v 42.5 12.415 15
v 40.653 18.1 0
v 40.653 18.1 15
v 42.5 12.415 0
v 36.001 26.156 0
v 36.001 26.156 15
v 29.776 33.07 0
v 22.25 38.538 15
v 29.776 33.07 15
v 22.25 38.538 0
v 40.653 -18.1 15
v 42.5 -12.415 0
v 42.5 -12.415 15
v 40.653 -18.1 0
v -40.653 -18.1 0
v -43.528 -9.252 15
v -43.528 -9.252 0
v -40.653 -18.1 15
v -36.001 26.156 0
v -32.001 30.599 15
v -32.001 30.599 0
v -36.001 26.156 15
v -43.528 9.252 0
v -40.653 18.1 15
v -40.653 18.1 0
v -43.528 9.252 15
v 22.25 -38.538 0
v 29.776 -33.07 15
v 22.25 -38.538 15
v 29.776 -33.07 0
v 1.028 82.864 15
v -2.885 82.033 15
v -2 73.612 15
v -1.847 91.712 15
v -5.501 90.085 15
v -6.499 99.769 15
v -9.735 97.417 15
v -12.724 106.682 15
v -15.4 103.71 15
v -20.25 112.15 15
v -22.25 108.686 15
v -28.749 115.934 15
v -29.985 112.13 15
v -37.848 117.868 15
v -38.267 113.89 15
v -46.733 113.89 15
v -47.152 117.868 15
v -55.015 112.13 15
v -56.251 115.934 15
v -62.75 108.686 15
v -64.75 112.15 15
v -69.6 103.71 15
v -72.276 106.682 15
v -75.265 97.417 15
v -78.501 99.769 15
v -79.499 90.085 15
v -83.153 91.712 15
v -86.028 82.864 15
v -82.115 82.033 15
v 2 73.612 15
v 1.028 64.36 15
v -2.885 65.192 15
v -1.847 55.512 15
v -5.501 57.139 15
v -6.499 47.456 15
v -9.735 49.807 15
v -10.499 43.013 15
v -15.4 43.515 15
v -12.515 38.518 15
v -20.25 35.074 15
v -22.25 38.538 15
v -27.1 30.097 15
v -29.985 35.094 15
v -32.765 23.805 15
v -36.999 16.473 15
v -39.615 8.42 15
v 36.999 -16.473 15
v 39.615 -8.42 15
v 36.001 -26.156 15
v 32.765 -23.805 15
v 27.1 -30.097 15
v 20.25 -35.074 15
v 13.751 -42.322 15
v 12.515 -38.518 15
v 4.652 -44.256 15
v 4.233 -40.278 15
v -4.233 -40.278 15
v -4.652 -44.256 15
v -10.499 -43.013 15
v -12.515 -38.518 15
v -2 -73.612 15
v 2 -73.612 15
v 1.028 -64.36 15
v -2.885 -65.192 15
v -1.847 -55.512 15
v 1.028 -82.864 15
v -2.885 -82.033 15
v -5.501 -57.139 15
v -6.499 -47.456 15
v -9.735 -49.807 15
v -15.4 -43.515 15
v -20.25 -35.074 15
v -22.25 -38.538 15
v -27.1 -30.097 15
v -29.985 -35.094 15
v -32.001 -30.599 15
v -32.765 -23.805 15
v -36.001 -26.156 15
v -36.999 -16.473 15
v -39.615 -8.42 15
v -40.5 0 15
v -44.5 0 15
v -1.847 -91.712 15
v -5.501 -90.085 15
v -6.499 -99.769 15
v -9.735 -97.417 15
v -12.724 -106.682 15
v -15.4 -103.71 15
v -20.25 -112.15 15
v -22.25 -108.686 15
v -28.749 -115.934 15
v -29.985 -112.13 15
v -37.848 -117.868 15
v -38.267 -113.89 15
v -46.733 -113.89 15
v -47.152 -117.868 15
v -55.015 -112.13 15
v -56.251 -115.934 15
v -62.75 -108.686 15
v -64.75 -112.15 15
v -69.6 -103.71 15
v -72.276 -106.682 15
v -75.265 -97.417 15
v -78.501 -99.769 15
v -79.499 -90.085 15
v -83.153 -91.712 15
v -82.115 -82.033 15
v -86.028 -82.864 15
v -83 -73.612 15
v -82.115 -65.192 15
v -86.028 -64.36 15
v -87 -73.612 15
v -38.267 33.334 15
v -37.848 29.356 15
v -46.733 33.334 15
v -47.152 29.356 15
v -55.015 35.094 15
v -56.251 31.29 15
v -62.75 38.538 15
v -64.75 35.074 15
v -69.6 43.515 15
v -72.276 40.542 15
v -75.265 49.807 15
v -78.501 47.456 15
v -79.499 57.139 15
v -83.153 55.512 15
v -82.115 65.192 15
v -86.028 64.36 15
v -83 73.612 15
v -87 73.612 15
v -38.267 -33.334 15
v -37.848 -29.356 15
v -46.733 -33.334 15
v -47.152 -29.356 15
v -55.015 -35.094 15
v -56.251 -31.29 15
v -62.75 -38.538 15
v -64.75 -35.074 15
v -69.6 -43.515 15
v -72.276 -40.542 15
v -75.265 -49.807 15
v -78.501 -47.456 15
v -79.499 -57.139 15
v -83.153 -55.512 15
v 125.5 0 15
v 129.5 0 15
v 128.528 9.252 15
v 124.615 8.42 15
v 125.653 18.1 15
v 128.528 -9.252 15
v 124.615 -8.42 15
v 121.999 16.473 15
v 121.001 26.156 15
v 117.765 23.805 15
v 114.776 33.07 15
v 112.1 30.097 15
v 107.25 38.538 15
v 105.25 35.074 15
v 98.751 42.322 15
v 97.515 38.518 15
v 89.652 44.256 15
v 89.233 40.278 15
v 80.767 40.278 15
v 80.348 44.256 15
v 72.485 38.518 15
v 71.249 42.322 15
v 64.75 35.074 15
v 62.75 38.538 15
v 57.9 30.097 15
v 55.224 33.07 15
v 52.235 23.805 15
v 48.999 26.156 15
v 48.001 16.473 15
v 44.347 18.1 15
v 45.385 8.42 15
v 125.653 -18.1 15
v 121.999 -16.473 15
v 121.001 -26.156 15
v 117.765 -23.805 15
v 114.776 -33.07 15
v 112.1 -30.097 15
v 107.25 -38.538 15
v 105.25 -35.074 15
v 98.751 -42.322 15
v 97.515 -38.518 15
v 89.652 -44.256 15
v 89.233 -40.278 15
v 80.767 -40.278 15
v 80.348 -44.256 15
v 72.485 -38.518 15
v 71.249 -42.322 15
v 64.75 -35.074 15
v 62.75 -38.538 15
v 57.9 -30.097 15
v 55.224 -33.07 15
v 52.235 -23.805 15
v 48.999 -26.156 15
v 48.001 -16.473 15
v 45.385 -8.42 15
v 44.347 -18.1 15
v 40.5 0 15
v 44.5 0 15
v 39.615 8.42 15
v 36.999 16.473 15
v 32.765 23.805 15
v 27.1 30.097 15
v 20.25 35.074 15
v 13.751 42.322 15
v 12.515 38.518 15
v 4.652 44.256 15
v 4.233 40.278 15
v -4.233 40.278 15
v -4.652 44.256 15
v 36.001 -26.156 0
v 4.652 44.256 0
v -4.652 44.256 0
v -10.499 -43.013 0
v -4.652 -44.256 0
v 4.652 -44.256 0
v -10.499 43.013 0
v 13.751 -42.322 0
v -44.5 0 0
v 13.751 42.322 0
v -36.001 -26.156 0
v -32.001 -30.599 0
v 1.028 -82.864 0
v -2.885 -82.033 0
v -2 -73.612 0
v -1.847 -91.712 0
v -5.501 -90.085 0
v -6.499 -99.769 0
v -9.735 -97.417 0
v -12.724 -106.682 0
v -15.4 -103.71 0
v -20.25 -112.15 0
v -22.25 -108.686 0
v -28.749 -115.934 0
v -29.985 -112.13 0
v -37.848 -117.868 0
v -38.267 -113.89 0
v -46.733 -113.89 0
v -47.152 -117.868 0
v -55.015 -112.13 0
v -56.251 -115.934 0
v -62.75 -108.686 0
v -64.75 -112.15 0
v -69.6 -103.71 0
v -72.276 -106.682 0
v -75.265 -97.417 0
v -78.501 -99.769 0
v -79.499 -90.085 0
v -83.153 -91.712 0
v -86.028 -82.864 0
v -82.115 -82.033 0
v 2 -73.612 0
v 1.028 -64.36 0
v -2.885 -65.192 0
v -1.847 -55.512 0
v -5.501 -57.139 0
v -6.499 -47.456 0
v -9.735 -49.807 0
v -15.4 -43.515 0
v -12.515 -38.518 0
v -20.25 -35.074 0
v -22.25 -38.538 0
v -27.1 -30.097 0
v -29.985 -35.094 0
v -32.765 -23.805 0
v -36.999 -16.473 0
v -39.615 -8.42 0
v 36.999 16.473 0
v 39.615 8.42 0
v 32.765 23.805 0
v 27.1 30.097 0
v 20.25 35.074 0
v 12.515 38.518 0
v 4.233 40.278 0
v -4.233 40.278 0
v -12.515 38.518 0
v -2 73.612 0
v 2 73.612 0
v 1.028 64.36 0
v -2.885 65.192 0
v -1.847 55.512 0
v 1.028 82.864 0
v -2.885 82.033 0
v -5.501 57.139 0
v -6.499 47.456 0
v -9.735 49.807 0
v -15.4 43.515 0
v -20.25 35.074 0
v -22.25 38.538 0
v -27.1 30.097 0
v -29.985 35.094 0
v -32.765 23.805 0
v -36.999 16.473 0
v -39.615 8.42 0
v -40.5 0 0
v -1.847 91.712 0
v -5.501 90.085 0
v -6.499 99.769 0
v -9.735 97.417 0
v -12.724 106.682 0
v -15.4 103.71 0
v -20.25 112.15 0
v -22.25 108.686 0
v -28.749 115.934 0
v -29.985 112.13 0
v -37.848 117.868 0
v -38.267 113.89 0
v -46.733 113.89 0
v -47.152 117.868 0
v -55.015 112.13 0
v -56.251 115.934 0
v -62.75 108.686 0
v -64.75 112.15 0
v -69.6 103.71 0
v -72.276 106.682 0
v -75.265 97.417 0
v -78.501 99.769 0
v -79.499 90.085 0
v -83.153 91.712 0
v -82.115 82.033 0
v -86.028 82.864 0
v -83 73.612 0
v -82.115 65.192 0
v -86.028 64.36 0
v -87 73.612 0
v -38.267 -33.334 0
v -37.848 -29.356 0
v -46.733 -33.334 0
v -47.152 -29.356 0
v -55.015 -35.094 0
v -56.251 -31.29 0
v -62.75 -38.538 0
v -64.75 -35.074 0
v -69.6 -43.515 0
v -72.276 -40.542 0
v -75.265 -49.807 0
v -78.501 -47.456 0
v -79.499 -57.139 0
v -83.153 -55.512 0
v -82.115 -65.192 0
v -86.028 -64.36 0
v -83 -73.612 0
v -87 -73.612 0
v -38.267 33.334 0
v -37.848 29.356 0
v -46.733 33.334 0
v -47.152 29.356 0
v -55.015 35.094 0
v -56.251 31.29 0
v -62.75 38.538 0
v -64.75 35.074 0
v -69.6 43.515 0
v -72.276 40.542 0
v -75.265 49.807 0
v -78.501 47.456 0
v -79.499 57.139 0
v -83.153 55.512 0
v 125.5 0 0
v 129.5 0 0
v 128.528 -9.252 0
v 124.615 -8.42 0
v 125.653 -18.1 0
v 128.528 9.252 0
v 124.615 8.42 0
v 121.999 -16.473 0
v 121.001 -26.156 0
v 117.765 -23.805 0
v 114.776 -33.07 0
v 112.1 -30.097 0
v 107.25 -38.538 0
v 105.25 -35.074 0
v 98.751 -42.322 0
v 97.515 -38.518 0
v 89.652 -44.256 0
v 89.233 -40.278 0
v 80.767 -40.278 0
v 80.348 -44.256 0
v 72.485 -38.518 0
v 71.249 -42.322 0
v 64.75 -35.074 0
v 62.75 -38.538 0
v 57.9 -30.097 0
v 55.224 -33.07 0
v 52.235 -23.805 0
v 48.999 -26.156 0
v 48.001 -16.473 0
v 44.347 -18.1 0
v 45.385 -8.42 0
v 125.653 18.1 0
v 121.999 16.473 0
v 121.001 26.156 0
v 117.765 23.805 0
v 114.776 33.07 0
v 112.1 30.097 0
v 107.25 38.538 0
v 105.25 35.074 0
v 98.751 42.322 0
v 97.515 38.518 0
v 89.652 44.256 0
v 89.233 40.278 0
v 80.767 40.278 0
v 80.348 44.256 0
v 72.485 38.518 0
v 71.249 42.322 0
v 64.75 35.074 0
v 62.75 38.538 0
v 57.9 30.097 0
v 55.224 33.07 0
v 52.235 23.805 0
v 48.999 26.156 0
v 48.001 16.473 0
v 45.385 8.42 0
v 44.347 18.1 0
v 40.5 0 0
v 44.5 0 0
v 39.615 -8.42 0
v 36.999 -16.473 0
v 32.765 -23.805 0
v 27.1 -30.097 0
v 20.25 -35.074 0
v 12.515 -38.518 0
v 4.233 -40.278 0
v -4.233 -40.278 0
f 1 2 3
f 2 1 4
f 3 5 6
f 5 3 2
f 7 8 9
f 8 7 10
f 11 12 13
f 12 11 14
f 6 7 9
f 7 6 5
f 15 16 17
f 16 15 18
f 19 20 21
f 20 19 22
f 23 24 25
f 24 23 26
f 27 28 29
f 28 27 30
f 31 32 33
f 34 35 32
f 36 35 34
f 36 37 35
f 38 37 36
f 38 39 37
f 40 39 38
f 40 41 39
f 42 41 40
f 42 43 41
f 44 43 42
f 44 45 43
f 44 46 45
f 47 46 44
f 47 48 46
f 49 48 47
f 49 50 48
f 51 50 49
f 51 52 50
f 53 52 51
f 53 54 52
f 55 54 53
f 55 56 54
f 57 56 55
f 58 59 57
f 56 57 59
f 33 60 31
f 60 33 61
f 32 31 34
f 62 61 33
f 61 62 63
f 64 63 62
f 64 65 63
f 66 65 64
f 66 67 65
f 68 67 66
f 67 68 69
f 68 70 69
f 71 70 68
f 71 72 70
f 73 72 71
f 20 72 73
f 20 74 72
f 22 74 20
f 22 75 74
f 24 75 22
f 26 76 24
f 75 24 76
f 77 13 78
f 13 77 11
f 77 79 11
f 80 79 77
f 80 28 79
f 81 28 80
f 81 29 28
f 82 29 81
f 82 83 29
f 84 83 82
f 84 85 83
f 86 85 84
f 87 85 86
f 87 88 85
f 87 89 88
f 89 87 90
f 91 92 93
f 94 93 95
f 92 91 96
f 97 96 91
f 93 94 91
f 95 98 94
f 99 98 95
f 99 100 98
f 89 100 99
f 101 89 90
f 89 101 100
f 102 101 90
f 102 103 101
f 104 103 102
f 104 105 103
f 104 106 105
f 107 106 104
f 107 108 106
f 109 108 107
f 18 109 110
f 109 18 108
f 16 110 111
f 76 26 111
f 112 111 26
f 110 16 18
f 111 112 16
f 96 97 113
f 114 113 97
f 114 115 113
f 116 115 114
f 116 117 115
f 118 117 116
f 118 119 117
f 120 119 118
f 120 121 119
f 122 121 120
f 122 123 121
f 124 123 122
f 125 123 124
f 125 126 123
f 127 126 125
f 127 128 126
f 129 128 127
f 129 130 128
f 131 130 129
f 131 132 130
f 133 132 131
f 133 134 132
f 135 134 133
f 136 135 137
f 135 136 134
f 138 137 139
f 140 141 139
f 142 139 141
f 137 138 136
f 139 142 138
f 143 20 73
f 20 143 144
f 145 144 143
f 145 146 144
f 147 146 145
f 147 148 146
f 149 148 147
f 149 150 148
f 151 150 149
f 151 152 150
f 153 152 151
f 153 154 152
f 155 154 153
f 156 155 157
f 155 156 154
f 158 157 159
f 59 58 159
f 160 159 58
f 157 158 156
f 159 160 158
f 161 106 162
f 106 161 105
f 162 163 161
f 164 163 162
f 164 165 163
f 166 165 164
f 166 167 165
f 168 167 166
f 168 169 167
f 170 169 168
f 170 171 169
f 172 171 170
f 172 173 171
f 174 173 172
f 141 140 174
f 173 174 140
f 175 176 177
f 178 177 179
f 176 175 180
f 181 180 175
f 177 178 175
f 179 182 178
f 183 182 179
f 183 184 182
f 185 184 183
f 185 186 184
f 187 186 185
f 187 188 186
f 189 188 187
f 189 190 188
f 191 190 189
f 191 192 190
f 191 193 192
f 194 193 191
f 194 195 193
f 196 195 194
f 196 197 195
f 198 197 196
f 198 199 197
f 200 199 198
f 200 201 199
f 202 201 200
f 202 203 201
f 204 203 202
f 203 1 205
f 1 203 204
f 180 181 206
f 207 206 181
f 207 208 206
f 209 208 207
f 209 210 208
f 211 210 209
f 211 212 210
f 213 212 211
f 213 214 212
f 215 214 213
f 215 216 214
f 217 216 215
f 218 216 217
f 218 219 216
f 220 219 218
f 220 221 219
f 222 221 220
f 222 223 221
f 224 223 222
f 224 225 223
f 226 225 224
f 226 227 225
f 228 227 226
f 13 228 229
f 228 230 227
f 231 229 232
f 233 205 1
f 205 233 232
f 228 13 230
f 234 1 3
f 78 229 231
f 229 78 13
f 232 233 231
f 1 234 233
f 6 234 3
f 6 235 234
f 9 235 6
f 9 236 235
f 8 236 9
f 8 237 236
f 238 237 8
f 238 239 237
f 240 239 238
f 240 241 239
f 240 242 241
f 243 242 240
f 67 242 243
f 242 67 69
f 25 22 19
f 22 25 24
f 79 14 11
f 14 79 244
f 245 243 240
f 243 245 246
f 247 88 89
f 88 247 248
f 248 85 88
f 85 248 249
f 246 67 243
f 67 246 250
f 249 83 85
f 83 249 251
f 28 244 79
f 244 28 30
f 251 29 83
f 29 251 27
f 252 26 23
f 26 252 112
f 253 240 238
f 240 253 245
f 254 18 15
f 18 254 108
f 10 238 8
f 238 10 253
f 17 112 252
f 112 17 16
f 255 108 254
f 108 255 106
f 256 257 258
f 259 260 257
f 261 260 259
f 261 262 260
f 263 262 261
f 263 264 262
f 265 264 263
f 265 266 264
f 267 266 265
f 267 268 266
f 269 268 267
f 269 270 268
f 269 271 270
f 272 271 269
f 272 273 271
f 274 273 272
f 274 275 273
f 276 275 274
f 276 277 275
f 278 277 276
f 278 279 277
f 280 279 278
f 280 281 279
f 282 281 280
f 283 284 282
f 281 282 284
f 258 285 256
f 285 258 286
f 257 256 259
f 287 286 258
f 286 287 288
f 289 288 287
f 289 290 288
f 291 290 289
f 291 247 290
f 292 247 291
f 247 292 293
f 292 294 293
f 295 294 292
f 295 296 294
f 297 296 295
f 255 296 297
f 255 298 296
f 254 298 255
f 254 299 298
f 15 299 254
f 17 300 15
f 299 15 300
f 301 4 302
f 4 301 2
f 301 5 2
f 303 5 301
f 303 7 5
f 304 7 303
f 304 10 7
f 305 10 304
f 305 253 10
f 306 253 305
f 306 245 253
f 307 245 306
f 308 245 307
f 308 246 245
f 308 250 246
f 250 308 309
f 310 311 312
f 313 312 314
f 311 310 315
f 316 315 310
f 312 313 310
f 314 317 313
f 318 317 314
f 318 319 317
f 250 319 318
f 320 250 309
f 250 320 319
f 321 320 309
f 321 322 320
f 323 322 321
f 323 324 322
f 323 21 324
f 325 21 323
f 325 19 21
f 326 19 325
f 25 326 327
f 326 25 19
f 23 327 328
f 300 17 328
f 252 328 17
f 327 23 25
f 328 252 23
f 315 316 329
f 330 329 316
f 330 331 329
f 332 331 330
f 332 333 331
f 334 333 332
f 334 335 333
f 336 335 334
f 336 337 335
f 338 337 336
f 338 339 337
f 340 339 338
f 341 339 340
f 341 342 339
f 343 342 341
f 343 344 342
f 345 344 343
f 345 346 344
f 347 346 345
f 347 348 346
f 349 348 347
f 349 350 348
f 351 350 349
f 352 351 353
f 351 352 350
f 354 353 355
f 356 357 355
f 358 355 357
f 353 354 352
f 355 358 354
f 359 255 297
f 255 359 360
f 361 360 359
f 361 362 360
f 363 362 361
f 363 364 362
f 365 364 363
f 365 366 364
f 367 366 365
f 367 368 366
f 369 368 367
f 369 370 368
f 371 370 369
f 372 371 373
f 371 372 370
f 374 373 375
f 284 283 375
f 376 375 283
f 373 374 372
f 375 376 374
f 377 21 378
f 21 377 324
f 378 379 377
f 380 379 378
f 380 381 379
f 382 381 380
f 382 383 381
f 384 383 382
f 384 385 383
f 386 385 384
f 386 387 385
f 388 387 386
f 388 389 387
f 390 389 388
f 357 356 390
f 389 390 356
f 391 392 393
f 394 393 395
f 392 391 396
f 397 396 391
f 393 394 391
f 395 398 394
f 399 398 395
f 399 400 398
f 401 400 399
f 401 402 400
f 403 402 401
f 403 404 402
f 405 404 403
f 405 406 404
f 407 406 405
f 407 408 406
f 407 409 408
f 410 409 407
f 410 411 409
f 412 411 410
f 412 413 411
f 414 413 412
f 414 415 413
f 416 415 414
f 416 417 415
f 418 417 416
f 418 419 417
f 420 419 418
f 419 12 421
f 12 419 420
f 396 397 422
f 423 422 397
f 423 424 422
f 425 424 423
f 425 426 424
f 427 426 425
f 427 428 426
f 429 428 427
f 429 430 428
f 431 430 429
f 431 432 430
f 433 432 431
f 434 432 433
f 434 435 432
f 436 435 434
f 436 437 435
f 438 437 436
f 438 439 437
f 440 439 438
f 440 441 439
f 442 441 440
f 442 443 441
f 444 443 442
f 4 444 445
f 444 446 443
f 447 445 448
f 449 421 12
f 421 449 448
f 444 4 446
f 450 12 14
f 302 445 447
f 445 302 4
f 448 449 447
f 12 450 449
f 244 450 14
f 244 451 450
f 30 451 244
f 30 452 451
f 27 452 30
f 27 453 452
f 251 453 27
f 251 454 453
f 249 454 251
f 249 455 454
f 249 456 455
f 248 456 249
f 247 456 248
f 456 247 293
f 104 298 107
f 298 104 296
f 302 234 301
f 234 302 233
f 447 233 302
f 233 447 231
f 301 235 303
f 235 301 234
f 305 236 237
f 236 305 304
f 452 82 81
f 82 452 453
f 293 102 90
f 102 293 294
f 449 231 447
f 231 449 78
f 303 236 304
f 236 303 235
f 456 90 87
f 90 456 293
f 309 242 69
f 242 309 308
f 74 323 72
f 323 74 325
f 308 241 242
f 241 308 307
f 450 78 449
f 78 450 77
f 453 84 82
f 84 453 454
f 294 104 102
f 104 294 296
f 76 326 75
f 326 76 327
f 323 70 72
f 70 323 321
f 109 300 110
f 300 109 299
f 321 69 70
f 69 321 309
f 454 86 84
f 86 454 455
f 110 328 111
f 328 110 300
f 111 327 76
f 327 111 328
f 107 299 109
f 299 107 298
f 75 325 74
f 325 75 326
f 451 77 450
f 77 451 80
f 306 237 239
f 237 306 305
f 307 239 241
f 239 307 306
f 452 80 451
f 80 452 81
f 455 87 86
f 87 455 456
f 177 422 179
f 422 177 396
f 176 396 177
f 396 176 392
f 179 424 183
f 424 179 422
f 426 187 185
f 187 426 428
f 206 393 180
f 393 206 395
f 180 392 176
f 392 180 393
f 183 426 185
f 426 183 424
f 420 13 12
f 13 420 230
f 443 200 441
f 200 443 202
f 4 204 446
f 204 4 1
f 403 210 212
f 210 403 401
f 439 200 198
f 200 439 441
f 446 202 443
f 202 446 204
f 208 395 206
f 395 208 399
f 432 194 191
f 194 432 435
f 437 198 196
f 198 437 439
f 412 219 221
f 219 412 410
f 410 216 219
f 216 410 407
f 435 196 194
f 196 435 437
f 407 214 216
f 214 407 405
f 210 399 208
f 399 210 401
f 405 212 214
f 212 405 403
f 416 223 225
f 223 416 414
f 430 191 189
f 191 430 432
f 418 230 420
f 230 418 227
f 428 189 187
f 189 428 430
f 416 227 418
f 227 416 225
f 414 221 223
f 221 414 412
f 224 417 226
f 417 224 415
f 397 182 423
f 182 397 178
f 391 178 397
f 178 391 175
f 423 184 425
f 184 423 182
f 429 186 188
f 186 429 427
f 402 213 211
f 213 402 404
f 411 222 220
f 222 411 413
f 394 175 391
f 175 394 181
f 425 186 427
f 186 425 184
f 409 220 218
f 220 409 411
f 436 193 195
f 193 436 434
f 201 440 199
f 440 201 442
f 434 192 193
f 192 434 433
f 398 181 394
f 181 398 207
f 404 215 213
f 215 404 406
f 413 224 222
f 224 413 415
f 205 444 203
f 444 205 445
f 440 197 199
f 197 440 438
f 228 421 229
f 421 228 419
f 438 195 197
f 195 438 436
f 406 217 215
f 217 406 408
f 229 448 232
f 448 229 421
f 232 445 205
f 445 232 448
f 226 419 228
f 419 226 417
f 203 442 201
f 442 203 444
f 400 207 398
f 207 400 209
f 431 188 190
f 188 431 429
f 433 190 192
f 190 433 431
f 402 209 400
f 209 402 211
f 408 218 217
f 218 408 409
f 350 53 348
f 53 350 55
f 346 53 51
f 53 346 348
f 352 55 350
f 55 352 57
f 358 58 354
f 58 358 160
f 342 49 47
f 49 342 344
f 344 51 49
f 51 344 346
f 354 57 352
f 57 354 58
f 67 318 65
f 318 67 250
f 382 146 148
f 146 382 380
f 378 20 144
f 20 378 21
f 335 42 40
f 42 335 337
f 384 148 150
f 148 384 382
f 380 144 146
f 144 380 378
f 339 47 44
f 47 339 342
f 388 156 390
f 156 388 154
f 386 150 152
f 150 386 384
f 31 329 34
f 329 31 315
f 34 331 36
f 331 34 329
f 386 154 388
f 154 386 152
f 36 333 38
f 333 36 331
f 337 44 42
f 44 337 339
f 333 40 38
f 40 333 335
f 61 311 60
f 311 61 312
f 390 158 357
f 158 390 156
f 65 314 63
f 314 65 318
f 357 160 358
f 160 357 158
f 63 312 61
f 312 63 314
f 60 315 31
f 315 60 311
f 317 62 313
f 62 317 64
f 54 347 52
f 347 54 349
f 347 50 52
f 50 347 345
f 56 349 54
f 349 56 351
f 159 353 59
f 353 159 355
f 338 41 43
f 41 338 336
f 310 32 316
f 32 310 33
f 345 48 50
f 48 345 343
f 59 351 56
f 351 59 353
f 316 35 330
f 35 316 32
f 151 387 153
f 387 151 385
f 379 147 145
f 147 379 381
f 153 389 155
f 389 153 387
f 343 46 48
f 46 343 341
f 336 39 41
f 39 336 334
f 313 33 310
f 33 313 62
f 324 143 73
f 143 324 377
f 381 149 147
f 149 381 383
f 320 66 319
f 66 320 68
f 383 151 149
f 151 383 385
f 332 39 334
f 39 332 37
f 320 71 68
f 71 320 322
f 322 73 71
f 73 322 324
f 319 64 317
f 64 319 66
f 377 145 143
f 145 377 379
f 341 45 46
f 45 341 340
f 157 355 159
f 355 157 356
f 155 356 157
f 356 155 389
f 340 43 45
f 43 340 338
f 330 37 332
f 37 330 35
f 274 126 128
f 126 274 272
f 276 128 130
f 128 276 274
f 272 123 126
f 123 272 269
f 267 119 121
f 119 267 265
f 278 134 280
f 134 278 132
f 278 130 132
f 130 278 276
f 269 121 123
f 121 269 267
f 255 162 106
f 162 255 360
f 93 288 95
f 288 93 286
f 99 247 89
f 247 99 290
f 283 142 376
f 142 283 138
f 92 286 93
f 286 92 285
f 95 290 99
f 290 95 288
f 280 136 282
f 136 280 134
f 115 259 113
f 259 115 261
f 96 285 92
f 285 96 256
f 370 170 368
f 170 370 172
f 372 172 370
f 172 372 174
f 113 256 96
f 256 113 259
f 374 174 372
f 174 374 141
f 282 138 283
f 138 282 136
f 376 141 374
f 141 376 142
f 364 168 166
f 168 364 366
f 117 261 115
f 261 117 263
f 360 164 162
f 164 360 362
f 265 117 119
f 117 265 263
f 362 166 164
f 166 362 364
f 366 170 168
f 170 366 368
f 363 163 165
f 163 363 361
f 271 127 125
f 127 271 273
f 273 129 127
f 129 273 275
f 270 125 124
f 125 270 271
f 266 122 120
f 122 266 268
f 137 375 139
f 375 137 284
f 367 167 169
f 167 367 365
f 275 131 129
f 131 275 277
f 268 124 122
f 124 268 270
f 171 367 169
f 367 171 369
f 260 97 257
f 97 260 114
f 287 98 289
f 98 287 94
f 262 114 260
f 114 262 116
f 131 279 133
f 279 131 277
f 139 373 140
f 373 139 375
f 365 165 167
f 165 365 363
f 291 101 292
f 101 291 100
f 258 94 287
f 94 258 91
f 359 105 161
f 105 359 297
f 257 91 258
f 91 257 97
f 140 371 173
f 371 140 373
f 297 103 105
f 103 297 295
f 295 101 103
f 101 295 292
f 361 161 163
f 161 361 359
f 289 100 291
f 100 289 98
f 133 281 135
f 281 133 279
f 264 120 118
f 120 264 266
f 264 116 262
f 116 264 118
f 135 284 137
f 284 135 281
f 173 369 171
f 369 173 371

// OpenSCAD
ring_diameter = 89;
ring_thickness = 4;

module ring(diameter, thickness) {
  outer_radius = diameter / 2;
  inner_radius = outer_radius - thickness;
  difference() {
    // outer cylinder
    cylinder(15, outer_radius, outer_radius, false);
    // inner cylinder, which gets subtracted from the outer in order to
    // make a ring
    translate([0,0,-1]) {
      cylinder(17, inner_radius, inner_radius, false);
    };
  };
};

module offset_ring(diameter, thickness) {
  translate([diameter - thickness, 0, 0]) {
    ring(diameter, thickness);
  };
}

// center ring
ring(ring_diameter, ring_thickness);

// three rings around the outside of the center ring
offset_ring(ring_diameter, ring_thickness);
rotate([0,0,120]) {
  offset_ring(ring_diameter, ring_thickness);
};
rotate([0,0,240]) {
  offset_ring(ring_diameter, ring_thickness);
};
